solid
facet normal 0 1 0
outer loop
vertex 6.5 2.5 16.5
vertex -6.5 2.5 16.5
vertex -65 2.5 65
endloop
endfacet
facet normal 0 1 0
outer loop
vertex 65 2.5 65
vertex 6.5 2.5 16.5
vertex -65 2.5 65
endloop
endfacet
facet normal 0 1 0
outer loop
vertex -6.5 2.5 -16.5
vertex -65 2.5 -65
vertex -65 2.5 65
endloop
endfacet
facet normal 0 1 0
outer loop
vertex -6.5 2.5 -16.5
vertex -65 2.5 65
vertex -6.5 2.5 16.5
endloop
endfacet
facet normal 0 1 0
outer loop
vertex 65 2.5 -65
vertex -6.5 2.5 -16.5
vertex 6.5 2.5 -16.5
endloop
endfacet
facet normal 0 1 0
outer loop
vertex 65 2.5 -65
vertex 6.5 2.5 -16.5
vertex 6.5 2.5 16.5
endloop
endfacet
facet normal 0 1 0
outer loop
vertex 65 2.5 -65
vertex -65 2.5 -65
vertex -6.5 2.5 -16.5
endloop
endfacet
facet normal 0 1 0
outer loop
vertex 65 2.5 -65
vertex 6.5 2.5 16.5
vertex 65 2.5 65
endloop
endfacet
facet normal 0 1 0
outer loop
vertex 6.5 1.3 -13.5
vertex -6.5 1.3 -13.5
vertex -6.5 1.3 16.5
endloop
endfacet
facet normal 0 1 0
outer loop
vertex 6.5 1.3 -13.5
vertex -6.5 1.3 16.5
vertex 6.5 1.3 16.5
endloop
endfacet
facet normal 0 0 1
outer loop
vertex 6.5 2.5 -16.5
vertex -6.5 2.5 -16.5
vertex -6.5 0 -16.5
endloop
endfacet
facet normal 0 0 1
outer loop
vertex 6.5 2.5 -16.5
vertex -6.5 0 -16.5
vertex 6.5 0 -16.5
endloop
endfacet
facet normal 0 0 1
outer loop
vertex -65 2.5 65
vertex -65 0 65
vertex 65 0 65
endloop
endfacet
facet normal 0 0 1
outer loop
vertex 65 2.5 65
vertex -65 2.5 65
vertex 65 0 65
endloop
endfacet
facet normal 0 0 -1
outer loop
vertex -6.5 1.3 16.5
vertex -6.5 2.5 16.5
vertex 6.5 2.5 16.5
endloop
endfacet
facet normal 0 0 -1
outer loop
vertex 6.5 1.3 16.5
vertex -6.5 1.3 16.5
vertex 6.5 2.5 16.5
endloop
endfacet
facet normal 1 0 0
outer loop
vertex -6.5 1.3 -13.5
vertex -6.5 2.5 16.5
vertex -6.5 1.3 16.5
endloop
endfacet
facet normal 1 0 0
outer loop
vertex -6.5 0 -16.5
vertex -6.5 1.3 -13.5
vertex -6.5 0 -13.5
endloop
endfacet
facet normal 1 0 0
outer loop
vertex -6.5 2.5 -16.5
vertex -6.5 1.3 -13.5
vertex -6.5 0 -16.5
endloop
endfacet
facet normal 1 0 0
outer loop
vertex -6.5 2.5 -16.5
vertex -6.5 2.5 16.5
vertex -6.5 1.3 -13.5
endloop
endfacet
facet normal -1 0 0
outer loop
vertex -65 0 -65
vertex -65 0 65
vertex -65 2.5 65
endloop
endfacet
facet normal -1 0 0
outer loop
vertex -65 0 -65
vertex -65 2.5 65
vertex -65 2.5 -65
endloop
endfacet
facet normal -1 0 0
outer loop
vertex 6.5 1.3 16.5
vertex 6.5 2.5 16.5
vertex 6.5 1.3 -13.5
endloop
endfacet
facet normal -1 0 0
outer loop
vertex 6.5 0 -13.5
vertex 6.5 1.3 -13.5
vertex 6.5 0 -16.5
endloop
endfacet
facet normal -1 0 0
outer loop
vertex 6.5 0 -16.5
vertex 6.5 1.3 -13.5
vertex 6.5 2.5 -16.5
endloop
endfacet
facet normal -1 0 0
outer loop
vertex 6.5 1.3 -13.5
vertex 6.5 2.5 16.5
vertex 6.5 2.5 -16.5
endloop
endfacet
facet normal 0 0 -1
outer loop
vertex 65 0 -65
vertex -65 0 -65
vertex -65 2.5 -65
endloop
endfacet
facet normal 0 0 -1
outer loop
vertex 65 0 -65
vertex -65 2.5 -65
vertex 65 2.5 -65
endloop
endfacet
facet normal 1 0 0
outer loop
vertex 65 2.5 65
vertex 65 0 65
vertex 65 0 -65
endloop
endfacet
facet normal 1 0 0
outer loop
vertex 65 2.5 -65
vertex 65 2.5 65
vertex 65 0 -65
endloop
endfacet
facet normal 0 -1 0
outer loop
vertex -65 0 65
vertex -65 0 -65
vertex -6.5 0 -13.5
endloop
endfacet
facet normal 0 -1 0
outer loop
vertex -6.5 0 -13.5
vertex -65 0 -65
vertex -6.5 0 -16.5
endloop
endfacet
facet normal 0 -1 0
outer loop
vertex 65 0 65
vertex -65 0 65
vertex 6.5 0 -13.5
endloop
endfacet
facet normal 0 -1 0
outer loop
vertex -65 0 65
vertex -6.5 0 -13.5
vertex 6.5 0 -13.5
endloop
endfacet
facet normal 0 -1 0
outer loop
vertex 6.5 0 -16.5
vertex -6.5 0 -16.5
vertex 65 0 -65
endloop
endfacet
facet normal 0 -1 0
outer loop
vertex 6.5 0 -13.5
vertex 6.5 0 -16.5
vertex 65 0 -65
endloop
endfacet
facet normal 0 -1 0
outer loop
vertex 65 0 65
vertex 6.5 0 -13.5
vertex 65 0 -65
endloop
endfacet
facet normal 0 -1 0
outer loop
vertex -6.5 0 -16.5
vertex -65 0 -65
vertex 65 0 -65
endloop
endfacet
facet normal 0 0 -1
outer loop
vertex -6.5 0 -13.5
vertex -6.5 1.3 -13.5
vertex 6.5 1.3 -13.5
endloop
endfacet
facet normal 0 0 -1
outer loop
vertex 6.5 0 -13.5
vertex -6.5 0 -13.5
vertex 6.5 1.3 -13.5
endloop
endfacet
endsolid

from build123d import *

# Parameters (mm, degrees)
SKETCH2_W           = 130
SKETCH2_H           = 130
BOSS_EXTRUDE1_DEPTH = 2.5
SKETCH3_W           = 13
SKETCH3_H           = 33
CUT_EXTRUDE1_DEPTH  = 1.2
SKETCH4_W           = 13
SKETCH4_H           = 3
CUT_EXTRUDE2_DEPTH  = 2.3


with BuildPart() as part:
    # Sketch2 → Boss-Extrude1 (new body)
    with BuildSketch(Plane(origin=(0, 0, 0), x_dir=(1, 0, 0), z_dir=(0, 1, 0))):
        Rectangle(SKETCH2_W, SKETCH2_H)
    extrude(amount=BOSS_EXTRUDE1_DEPTH)

    # Sketch3 → Cut-Extrude1 (cut)
    with BuildSketch(Plane(origin=(0, 2.5, 0), x_dir=(1, 0, 0), z_dir=(0, 1, 0))):
        Rectangle(SKETCH3_W, SKETCH3_H)
    extrude(amount=-CUT_EXTRUDE1_DEPTH, mode=Mode.SUBTRACT)

    # Sketch4 → Cut-Extrude2 (cut, through all)
    with BuildSketch(Plane(origin=(0, 1.3, 0), x_dir=(1, 0, 0), z_dir=(0, 1, 0))):
        with Locations((0, 15)):
            Rectangle(SKETCH4_W, SKETCH4_H)
    extrude(amount=-CUT_EXTRUDE2_DEPTH, mode=Mode.SUBTRACT)


solid = part.part
